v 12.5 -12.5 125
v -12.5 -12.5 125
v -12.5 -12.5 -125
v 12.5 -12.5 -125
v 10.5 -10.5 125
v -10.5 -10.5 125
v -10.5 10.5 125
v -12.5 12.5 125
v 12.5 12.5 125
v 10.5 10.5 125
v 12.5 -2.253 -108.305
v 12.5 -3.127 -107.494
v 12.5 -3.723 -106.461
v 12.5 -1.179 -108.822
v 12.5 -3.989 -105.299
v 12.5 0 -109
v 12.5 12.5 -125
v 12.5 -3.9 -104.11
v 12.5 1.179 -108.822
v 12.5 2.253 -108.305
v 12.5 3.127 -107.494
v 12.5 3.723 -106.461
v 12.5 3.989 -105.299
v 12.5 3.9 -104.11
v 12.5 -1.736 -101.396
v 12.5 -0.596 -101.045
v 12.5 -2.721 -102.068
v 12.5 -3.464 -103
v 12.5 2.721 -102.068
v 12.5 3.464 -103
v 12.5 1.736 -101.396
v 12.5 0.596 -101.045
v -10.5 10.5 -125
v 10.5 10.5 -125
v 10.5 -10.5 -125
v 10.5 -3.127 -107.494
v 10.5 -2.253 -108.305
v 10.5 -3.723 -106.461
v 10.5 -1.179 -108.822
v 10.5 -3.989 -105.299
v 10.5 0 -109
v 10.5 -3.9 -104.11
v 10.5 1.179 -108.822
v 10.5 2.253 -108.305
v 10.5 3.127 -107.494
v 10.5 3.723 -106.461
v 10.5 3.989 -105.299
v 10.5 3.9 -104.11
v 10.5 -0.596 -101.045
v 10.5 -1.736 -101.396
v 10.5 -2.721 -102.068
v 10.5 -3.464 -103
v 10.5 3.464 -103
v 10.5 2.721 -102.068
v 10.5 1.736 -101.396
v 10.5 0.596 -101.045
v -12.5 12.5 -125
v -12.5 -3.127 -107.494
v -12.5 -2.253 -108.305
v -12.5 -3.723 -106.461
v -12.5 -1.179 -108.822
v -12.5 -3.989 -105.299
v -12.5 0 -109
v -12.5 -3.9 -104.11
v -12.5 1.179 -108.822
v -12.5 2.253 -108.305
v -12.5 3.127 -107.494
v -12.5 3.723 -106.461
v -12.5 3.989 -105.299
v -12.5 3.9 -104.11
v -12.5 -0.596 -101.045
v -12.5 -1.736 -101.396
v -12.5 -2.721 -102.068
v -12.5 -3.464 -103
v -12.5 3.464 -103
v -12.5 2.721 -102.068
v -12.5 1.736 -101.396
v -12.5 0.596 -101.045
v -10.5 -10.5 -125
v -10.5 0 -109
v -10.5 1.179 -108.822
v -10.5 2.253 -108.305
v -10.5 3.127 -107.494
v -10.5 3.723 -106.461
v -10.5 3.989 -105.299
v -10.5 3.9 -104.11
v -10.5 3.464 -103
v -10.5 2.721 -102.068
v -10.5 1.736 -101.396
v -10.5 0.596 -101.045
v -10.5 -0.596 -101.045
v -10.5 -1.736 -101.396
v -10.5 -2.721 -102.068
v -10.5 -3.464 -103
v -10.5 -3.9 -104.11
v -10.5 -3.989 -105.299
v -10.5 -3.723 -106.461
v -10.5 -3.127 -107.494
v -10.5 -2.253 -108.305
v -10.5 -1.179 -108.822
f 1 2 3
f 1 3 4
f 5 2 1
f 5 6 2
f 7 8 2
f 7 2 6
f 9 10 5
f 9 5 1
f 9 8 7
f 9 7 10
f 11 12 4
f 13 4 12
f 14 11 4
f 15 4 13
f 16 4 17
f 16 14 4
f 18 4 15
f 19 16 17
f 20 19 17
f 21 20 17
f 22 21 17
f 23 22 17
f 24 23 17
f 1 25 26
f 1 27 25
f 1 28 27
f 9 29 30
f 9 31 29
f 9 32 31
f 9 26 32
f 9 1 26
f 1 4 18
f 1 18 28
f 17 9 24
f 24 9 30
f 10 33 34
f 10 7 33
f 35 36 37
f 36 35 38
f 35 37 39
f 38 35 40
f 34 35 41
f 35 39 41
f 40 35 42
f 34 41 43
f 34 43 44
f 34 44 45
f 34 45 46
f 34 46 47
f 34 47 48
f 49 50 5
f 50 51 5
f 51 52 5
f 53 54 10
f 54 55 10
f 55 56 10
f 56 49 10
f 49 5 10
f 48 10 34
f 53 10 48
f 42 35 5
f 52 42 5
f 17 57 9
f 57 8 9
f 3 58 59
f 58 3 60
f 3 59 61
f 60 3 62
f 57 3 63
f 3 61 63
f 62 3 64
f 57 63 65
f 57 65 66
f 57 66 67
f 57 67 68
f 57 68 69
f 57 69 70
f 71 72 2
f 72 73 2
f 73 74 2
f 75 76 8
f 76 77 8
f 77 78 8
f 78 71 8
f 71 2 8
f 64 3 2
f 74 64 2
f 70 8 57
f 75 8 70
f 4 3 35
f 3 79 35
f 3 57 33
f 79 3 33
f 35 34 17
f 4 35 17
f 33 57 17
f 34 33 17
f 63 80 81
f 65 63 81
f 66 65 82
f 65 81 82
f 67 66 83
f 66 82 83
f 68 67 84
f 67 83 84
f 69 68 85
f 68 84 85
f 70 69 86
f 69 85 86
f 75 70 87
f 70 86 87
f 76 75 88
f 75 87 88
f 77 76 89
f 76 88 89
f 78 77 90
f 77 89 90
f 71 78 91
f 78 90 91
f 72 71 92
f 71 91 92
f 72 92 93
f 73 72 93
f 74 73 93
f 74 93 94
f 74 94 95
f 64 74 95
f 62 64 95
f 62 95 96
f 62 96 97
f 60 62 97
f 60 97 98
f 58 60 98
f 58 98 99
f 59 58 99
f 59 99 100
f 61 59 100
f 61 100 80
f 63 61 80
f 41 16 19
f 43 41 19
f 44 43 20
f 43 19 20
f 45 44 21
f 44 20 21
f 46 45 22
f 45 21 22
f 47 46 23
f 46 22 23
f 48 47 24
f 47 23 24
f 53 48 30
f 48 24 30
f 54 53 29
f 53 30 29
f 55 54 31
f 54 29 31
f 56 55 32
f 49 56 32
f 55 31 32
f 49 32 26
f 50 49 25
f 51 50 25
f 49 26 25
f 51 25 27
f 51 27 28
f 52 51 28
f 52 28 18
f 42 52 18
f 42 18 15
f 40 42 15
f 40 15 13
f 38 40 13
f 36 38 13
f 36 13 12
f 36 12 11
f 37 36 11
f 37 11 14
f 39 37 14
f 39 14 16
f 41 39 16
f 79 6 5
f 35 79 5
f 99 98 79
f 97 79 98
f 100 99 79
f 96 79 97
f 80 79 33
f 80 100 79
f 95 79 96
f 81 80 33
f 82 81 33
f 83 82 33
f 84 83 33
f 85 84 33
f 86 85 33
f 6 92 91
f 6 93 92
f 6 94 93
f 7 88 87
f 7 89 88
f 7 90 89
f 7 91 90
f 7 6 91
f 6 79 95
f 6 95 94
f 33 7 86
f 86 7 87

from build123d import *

# Parameters (mm, degrees)
SKETCH2_W           = 25
SKETCH2_H           = 25
SKETCH2_W_2         = 21
SKETCH2_H_2         = 21
EXTRUDE_THIN1_DEPTH = 125
SKETCH3_R           = 4
HOLE_DEPTH          = 129.086884574


with BuildPart() as part:
    # Sketch2 → Extrude-Thin1 (new, symmetric)
    with BuildSketch(Plane.XY):
        Rectangle(SKETCH2_W, SKETCH2_H)
        Rectangle(SKETCH2_W_2, SKETCH2_H_2, mode=Mode.SUBTRACT)
    extrude(amount=EXTRUDE_THIN1_DEPTH, both=True)

    # Sketch3 → hole (cut, through all)
    with BuildSketch(Plane(origin=(12.5, 0, 0), x_dir=(0, 0, -1), z_dir=(1, 0, 0))):
        with Locations((105, 0)):
            Circle(SKETCH3_R)
    extrude(amount=-HOLE_DEPTH, mode=Mode.SUBTRACT)


solid = part.part
